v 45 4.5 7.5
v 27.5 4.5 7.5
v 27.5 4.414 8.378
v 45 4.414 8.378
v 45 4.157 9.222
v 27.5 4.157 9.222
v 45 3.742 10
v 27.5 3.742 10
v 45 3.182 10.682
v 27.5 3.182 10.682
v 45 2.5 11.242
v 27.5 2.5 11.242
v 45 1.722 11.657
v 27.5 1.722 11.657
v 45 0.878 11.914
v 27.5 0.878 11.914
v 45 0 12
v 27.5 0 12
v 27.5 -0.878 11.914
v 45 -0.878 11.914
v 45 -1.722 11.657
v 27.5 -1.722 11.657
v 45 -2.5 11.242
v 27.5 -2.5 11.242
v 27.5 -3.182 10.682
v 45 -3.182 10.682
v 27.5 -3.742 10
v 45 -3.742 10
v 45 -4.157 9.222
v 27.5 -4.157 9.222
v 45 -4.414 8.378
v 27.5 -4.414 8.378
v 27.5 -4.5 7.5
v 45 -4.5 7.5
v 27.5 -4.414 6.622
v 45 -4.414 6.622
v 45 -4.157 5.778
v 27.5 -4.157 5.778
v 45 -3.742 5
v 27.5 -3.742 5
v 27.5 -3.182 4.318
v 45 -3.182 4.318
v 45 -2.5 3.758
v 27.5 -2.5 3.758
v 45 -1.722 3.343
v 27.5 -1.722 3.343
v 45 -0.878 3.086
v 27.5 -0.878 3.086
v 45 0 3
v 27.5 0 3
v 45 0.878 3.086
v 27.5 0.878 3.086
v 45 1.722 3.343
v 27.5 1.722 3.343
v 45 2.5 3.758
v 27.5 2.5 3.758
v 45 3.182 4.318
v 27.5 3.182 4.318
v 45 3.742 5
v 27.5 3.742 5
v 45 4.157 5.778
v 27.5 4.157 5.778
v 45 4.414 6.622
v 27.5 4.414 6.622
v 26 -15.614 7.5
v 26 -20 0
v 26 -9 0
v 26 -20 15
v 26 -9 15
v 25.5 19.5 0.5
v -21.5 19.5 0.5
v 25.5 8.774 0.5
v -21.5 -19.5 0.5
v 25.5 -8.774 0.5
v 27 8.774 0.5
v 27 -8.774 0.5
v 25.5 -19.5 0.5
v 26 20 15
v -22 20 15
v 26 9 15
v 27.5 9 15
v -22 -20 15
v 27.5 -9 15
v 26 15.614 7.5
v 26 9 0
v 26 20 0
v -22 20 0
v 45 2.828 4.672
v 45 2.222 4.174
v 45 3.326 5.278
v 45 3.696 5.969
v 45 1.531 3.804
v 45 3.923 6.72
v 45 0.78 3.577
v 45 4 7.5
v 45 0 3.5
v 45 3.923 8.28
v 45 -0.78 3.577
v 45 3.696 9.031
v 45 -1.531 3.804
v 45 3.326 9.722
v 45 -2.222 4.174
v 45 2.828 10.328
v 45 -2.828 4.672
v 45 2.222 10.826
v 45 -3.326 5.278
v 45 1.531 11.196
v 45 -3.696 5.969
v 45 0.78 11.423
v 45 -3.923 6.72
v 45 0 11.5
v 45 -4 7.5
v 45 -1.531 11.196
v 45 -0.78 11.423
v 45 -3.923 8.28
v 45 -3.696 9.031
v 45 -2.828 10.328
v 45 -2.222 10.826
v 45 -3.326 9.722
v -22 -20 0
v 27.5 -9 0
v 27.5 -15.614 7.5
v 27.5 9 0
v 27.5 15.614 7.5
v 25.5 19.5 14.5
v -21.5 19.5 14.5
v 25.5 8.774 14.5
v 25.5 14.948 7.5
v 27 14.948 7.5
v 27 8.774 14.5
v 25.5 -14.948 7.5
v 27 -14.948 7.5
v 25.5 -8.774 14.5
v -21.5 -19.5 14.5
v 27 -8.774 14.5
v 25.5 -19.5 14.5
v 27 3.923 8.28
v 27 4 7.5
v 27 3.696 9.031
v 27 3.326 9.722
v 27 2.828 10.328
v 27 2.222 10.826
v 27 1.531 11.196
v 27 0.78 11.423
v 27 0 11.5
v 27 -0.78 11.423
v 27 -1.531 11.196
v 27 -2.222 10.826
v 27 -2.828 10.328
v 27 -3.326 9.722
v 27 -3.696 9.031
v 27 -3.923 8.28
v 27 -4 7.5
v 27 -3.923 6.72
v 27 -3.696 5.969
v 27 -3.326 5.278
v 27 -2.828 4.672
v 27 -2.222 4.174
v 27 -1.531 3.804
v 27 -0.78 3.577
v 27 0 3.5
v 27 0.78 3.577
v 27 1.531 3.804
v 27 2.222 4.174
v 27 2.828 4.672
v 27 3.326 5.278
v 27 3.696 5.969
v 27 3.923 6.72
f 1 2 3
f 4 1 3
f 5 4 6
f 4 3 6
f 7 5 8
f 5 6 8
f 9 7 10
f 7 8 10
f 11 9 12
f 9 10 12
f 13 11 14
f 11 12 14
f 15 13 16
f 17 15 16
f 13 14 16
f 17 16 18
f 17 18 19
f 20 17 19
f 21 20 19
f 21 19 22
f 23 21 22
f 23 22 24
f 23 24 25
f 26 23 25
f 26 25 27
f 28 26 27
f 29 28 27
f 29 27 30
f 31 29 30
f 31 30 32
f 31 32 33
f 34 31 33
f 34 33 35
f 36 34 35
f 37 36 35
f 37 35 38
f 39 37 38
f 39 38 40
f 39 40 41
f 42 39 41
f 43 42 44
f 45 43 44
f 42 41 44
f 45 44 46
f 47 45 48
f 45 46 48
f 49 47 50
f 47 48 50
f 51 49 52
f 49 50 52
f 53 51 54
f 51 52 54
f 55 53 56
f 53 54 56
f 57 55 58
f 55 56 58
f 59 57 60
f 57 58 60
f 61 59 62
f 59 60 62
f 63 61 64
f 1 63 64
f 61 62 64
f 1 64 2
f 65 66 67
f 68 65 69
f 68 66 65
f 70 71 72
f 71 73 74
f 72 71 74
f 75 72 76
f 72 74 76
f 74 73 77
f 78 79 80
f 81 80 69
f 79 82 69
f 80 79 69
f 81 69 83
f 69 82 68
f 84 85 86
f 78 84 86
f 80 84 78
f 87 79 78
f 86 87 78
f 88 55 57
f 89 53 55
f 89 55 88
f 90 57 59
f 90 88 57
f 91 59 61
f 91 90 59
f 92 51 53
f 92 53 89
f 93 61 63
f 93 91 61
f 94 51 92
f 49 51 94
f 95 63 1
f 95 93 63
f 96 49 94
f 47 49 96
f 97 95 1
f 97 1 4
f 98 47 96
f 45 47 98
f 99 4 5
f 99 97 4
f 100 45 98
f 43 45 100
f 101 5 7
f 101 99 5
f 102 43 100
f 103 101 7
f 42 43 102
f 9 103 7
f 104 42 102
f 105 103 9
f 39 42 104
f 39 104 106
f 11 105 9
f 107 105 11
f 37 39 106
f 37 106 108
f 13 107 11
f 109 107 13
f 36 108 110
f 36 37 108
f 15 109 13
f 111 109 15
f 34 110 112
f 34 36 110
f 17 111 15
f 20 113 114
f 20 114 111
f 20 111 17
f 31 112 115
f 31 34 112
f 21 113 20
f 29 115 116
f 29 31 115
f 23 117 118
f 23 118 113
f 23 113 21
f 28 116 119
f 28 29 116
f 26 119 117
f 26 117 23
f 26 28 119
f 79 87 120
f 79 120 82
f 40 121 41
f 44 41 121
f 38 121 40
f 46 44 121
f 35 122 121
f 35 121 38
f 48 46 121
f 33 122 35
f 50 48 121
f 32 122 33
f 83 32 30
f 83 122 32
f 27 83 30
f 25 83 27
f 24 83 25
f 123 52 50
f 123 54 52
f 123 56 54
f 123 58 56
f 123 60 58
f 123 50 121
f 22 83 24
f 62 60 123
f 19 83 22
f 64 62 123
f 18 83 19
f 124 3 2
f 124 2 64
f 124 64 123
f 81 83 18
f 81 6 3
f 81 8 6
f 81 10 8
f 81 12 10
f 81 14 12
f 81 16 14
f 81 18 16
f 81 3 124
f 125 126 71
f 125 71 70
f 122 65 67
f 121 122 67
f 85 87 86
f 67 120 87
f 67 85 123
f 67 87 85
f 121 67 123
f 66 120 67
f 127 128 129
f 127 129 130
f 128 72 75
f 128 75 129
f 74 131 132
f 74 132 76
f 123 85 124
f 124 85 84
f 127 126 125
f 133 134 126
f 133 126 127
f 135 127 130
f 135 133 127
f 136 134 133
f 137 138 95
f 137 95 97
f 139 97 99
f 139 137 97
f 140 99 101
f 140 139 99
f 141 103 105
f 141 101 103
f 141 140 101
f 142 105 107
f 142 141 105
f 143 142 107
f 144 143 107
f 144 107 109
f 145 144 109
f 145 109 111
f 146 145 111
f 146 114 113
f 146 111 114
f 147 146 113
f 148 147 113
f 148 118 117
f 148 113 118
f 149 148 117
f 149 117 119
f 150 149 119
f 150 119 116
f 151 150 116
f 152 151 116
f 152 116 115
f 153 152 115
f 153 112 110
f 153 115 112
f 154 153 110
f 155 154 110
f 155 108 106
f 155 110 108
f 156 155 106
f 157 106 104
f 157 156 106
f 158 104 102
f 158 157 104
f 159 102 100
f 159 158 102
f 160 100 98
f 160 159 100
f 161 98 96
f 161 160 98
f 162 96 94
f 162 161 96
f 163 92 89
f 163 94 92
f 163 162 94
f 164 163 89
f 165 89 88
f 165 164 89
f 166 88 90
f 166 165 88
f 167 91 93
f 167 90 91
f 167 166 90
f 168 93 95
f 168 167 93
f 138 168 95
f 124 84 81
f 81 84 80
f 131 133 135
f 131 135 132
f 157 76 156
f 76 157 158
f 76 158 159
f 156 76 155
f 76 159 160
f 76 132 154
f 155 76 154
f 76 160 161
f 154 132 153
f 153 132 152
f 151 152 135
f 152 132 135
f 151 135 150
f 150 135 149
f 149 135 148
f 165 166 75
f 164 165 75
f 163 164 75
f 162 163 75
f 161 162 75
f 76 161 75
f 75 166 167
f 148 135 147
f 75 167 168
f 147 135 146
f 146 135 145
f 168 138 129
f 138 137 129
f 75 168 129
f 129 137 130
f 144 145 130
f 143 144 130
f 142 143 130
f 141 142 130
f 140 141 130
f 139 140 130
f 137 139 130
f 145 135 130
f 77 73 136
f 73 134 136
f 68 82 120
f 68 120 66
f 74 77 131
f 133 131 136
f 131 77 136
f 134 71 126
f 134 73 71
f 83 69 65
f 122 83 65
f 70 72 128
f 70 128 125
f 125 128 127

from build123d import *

# Parameters (mm, degrees)
F0_W     = 48
F0_H     = 15
F1_DEPTH = 20
F2_R     = 4.5
F3_DEPTH = 1.5
F4_DEPTH = 19
F5_T     = -0.5


with BuildPart() as f1:
    # F0 (on Front) → F1 (new body, symmetric)
    with BuildSketch(Plane.XZ):
        with Locations((2, 7.5)):
            Rectangle(F0_W, F0_H)
    extrude(amount=F1_DEPTH, both=True)

    # F2 (on face) → F3 (join)
    with BuildSketch(Plane.YZ.offset(26)):
        Polygon((-15.6143782777, 7.5), (-9, 0), (0, 0), (9, 0), (15.6143782777, 7.5), (9, 15), (0, 15), (-9, 15), align=None)
        with Locations((0, 7.5)):
            Circle(F2_R, mode=Mode.SUBTRACT)
    extrude(amount=F3_DEPTH)

    # F4 (add): a face of the model
    f4_faces = [f1.faces().sort_by_distance(p)[0] for p in [
        (26, 0, 7.5),
    ]]
    extrude(f4_faces, amount=F4_DEPTH)

    # F5
    f5_openings = [f1.faces().sort_by_distance(p)[0] for p in [
        (45, 0, 7.5),
    ]]
    offset(amount=F5_T, openings=f5_openings, kind=Kind.INTERSECTION)


solid = f1.part
